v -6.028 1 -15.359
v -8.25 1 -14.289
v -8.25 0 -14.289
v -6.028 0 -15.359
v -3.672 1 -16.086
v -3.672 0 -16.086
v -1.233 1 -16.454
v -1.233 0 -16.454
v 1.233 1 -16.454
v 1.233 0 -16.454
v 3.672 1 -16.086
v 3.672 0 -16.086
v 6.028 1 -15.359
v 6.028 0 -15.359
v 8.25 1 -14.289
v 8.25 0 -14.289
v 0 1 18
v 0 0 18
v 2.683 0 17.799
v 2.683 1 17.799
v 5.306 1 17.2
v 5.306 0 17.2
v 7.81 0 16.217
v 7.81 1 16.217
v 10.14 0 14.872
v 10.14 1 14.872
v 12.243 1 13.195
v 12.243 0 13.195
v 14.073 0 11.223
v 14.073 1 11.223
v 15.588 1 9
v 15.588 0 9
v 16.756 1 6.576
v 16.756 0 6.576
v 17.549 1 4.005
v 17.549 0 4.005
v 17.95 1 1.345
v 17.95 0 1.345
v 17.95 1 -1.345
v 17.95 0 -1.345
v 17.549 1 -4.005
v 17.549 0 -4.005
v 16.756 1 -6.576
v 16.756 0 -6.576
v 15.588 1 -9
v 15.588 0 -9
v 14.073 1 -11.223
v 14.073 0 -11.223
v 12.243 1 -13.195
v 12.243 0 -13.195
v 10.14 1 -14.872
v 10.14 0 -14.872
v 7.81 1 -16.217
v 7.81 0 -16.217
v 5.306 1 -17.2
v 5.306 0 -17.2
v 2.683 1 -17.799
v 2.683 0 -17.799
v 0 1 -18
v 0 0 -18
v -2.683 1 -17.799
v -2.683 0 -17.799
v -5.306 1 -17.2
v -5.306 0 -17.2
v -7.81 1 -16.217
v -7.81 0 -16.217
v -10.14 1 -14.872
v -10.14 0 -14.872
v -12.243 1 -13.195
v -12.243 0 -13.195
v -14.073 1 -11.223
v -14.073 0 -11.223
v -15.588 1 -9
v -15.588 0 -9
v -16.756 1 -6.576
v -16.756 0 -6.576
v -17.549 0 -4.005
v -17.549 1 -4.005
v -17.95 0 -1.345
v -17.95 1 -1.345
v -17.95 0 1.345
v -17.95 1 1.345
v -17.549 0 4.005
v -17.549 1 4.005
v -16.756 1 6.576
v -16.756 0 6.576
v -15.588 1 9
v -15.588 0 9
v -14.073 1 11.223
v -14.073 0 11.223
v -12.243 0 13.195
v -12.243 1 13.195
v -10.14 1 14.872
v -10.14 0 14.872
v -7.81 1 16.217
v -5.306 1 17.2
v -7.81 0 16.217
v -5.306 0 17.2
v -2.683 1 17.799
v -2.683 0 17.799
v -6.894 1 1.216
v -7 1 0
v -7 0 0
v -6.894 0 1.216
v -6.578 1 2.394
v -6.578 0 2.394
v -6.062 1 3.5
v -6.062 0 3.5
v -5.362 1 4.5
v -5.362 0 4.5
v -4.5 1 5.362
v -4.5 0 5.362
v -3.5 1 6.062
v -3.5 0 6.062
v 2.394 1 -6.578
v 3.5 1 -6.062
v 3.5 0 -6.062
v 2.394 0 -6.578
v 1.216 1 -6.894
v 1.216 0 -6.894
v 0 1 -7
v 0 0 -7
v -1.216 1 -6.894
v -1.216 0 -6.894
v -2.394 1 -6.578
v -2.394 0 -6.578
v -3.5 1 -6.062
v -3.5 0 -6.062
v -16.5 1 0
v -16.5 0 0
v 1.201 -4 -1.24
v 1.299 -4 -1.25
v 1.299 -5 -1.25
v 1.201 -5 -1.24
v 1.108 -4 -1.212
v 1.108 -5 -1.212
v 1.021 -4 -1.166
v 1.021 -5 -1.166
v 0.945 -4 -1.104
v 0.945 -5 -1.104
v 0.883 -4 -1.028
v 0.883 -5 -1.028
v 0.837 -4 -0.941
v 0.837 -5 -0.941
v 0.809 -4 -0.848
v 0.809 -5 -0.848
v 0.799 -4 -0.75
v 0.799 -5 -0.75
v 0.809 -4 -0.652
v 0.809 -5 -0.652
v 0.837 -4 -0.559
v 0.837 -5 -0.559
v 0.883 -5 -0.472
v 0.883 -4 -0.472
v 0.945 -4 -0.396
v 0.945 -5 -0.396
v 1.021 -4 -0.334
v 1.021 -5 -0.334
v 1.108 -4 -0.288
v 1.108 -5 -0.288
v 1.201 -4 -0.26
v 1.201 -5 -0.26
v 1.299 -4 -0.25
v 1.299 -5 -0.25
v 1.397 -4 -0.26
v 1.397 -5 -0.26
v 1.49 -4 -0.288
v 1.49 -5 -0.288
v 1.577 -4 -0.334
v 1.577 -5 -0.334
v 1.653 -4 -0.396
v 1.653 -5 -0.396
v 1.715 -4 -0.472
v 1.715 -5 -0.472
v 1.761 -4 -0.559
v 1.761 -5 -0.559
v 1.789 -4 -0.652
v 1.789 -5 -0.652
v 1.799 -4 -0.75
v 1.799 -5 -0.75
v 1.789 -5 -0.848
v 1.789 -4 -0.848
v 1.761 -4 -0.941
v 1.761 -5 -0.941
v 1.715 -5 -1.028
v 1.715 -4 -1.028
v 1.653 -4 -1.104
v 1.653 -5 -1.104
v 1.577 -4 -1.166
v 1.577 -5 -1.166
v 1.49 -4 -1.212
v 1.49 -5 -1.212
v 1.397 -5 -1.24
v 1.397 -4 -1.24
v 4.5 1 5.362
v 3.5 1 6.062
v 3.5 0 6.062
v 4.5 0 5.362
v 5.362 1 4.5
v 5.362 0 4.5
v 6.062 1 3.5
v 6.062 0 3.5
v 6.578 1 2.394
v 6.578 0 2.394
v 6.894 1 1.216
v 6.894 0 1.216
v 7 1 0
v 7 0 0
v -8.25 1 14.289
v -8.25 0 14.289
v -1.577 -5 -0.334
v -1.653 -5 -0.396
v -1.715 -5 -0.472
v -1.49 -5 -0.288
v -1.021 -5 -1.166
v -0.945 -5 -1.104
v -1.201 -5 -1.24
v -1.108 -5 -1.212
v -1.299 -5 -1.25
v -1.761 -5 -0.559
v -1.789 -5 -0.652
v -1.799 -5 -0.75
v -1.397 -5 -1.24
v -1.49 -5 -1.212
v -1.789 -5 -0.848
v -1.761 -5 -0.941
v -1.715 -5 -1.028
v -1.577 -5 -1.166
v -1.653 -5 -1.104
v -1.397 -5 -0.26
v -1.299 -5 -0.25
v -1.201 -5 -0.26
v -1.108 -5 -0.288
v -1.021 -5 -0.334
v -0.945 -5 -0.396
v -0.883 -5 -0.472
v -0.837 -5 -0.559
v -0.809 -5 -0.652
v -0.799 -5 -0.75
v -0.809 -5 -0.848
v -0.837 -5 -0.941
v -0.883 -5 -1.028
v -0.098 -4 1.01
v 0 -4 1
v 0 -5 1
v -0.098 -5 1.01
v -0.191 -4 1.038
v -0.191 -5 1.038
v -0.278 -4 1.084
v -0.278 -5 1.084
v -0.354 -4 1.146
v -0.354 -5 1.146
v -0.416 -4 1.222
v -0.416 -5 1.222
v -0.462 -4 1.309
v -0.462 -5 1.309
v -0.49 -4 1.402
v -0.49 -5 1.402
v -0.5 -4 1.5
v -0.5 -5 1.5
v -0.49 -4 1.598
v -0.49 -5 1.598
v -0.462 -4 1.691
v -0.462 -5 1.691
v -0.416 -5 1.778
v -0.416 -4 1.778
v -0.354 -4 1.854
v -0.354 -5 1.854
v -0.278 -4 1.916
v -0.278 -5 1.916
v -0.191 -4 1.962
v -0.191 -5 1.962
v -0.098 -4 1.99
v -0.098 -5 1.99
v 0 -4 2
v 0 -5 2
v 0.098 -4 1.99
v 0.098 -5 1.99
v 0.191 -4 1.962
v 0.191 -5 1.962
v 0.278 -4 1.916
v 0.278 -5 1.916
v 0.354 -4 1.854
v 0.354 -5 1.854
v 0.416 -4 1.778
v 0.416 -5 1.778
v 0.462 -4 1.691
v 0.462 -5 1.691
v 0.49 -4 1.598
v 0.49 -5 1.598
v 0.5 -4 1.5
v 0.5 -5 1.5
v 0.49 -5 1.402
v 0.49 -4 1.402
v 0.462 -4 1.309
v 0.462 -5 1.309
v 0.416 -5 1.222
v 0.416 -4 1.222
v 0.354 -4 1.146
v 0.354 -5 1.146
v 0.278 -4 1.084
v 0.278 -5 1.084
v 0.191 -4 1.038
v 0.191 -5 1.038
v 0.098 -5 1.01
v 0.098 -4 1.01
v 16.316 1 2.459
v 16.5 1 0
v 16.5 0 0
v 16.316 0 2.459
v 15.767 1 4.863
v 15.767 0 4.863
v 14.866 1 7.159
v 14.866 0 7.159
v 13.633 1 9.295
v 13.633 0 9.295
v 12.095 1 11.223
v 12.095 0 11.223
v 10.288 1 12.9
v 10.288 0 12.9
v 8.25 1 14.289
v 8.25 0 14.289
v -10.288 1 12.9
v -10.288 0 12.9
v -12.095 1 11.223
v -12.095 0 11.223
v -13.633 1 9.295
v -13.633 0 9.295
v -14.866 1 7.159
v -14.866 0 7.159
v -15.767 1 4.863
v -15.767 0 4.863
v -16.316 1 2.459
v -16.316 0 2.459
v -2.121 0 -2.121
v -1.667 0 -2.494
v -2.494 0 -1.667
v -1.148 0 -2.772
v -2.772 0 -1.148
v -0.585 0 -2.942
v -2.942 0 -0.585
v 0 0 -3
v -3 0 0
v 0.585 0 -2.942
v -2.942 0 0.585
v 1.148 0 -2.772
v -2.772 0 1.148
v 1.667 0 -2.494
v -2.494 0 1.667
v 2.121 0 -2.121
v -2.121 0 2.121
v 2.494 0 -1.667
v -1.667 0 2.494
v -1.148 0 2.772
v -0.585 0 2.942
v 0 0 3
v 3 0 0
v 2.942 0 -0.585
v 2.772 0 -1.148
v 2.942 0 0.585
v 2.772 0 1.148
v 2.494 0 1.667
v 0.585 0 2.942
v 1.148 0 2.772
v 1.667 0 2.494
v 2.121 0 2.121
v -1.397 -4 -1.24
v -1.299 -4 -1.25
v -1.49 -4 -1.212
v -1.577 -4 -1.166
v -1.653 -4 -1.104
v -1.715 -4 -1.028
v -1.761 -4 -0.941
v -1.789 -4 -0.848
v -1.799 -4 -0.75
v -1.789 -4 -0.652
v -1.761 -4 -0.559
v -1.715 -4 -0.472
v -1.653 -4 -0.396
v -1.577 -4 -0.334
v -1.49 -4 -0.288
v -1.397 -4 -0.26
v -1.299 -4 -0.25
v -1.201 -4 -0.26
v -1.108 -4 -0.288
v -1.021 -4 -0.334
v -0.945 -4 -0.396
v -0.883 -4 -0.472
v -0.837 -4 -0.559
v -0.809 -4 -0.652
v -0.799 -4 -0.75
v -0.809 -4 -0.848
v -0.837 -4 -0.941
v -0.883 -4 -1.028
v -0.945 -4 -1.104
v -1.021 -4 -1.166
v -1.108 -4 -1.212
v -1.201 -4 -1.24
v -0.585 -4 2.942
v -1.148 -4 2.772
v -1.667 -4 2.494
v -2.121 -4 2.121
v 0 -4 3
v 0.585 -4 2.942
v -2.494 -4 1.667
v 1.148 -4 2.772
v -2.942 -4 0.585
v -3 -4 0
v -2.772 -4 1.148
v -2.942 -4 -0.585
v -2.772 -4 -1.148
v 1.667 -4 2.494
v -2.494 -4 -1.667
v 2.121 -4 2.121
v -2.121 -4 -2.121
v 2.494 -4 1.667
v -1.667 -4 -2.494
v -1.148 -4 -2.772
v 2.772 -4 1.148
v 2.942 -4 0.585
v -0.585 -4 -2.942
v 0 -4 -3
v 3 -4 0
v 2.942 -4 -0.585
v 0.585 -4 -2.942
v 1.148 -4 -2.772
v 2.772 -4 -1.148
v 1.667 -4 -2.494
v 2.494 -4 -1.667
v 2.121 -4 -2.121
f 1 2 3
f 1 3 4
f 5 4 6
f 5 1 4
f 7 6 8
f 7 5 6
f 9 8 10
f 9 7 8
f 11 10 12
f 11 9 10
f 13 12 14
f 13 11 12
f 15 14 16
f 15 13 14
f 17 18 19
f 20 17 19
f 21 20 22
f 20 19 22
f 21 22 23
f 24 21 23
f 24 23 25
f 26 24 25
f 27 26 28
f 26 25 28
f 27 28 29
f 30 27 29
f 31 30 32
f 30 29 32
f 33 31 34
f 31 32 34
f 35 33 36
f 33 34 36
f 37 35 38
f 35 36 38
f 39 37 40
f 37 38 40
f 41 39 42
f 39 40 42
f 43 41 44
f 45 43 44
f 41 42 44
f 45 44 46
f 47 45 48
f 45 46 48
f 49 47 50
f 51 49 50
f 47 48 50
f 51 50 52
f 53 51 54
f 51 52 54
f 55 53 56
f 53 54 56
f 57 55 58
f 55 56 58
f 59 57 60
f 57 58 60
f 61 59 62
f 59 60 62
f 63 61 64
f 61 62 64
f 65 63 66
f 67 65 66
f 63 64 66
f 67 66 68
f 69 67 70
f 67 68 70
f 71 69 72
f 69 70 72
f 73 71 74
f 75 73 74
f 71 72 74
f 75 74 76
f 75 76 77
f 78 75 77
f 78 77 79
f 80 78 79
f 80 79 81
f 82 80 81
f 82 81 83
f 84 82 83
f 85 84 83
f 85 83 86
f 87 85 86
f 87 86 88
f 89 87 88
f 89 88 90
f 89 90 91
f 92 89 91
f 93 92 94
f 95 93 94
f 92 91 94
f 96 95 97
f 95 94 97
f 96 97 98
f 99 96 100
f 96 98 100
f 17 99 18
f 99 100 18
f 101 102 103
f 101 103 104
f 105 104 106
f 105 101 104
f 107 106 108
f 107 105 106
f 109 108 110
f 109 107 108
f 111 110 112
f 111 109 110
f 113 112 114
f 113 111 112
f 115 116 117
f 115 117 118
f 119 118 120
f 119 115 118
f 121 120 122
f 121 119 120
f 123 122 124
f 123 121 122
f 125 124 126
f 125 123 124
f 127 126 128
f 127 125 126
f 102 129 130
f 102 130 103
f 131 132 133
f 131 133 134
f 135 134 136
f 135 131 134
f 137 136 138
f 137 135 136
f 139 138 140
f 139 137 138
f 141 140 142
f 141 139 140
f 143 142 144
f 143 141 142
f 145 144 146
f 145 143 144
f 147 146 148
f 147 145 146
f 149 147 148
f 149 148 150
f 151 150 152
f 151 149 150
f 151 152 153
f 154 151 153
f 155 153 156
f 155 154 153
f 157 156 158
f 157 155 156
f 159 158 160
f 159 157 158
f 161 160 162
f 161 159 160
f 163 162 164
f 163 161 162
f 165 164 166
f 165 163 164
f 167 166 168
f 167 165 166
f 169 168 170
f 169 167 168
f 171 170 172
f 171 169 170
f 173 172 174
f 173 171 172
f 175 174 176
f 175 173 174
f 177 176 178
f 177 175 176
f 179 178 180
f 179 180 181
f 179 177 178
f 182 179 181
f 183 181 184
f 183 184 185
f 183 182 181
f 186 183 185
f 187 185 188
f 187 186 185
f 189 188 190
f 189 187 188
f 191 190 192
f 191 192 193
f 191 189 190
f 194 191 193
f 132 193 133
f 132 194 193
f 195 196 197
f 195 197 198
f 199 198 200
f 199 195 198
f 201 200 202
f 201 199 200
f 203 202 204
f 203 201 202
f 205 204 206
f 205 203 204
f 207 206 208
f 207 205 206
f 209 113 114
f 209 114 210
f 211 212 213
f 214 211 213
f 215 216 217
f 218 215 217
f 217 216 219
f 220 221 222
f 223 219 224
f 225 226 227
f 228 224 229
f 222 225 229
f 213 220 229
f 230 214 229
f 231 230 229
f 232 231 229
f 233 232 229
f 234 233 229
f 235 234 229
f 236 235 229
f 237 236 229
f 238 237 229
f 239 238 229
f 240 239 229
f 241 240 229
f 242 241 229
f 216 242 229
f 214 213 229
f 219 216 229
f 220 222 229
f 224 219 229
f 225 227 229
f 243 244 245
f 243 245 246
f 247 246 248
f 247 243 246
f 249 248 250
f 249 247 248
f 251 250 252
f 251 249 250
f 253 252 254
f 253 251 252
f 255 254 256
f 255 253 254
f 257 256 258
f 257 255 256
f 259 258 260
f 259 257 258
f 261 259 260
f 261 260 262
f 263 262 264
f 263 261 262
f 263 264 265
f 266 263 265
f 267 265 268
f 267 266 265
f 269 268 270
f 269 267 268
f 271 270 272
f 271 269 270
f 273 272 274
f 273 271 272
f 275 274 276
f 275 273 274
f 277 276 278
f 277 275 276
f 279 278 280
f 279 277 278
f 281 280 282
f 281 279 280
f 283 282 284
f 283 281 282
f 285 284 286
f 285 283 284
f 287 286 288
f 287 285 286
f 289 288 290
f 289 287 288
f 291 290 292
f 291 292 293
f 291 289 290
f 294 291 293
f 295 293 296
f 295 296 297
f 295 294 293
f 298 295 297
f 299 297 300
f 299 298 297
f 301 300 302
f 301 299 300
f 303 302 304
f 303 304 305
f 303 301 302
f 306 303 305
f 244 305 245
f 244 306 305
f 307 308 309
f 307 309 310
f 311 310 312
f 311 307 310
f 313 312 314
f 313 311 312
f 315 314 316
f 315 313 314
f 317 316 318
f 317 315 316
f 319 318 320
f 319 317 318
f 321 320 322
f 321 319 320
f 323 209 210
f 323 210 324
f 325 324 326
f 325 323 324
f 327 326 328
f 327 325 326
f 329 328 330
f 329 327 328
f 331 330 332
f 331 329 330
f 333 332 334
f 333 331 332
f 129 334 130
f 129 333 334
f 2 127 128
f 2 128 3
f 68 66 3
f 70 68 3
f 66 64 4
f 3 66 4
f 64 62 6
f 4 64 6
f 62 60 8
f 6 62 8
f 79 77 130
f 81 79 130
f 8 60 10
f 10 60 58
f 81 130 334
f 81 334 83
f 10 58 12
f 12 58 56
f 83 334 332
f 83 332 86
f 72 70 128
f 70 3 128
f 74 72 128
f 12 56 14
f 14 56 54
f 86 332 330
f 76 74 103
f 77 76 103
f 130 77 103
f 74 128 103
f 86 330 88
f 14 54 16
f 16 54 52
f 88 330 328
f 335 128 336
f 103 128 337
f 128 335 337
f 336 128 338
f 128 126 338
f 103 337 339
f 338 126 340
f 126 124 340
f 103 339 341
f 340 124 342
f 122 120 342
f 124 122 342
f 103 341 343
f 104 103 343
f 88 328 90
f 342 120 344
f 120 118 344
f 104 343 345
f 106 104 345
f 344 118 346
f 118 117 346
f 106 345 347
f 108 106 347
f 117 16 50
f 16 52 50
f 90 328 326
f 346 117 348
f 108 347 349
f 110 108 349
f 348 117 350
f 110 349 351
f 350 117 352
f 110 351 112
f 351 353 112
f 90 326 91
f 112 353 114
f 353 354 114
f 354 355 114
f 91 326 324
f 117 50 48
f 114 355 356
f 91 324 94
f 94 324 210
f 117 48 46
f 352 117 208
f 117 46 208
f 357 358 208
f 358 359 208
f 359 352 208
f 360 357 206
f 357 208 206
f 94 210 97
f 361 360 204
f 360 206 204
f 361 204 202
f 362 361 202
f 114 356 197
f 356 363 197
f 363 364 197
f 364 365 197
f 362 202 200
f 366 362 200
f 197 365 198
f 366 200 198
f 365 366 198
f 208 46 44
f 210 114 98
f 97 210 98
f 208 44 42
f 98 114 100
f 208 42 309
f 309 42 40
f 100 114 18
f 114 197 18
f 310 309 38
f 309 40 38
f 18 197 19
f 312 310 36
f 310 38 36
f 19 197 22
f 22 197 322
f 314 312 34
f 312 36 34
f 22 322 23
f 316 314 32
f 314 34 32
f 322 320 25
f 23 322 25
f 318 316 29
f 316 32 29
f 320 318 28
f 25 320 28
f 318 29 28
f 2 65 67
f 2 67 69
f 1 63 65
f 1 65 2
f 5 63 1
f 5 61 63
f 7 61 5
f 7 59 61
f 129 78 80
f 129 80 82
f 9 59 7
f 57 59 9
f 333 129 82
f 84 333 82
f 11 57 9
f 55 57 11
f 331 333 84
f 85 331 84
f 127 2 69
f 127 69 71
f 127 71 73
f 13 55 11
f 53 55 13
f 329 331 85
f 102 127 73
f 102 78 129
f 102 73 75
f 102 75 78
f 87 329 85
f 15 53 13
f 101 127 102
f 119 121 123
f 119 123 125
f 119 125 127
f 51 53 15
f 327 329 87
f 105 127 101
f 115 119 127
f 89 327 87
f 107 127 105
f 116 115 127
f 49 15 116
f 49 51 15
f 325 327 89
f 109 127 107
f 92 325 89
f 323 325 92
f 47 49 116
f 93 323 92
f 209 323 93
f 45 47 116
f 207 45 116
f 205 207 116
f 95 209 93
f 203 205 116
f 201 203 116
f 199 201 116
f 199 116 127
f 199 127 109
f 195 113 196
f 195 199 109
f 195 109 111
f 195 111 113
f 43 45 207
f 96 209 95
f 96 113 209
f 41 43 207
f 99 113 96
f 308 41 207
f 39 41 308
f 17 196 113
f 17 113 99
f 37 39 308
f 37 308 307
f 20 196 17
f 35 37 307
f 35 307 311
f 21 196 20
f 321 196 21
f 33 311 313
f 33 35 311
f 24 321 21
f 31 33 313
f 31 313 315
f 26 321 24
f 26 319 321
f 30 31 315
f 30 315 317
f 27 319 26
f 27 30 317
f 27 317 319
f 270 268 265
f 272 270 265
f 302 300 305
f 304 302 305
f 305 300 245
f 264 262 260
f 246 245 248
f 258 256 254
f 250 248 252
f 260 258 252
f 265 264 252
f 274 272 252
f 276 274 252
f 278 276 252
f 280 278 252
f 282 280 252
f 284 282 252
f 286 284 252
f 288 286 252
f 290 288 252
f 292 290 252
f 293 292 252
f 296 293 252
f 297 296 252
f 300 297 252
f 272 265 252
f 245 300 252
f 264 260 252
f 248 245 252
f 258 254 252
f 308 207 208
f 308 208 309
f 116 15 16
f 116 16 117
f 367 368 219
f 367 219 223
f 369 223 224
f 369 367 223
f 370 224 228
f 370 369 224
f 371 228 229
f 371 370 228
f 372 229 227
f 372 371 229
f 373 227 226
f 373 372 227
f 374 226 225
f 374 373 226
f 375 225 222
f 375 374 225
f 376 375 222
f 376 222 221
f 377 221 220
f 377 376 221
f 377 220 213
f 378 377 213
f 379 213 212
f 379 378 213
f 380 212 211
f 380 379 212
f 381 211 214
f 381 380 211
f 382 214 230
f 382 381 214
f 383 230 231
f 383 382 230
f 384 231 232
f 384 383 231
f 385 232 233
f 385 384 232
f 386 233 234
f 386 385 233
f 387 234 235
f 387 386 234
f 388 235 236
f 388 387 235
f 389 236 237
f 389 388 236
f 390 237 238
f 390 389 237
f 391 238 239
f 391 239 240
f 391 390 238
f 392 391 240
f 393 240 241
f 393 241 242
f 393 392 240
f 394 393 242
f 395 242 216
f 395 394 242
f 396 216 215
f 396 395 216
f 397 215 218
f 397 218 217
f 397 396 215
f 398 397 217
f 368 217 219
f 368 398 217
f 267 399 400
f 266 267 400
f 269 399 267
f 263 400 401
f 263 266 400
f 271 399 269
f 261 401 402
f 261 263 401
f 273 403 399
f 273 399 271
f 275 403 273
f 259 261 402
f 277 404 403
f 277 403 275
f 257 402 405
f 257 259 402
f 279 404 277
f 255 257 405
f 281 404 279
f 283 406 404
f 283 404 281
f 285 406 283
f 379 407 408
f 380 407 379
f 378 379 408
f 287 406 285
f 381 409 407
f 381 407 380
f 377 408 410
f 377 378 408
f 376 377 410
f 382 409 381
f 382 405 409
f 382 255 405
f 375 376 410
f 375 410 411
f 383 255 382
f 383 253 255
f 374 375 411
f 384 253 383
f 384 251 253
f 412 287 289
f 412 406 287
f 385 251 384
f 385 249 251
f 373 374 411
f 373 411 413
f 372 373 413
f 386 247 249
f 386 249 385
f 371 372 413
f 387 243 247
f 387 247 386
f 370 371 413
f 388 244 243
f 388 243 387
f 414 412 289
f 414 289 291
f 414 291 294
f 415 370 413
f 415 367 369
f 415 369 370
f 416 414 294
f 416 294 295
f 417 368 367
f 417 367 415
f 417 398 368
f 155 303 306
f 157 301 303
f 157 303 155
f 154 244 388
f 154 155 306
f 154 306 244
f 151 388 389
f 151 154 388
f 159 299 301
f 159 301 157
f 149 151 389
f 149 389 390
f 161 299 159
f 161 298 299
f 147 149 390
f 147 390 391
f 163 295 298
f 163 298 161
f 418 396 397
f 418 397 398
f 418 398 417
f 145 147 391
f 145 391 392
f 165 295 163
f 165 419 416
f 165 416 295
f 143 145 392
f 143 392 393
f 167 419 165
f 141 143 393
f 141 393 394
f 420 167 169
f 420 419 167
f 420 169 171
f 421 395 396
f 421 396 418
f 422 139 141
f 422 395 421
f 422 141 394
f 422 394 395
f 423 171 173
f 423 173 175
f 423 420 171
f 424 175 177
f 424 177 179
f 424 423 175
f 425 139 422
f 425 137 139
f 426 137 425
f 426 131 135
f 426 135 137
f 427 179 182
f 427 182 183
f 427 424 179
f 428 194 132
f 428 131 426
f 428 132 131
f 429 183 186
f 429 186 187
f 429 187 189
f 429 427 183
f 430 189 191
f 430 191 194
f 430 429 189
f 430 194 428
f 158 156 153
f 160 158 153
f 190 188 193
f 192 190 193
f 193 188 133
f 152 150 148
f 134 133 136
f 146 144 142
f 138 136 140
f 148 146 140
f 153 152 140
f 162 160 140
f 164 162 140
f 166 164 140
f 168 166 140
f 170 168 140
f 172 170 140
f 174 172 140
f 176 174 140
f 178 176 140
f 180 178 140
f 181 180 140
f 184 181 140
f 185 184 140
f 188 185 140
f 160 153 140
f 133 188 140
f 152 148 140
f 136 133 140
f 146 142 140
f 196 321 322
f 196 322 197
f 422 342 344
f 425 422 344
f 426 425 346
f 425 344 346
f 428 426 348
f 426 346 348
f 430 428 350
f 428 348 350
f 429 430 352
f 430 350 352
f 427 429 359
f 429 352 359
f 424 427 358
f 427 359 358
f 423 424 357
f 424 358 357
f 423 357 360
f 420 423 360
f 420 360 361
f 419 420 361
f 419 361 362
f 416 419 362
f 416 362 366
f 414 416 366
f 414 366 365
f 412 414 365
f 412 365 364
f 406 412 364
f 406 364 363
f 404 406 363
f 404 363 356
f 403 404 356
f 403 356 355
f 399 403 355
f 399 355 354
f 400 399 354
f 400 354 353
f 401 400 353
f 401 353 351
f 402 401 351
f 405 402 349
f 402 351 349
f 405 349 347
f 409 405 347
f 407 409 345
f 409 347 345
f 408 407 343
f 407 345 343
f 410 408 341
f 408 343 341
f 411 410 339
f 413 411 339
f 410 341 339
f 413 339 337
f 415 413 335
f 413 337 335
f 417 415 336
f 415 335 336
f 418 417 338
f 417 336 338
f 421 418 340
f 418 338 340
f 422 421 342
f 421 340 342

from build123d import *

# Parameters (mm, degrees)
SKETCH1_R                = 18
BOSS_EXTRUDE1_DEPTH      = 1
SKETCH4_R                = 0.5
CUT_EXTRUDE2_DEPTH       = 1
BOSS_EXTRUDE2_DEPTH      = 4
BOSS_EXTRUDE2_DEPTH_BACK = 1
SKETCH5_R                = 3
BOSS_EXTRUDE3_START      = -5
SKETCH4_3_R              = 0.5
BOSS_EXTRUDE3_DEPTH      = 1


with BuildPart() as part:
    # Sketch1 → Boss-Extrude1 (new body)
    with BuildSketch(Plane(origin=(0, 0, 0), x_dir=(1, 0, 0), z_dir=(0, 1, 0))):
        with Locations(Location((0, 0, 0), (0, 0, 270))):
            Circle(SKETCH1_R)
    extrude(amount=BOSS_EXTRUDE1_DEPTH)

    # Sketch4 → Cut-Extrude2 (cut)
    with BuildSketch(Plane(origin=(0, 1, 0), x_dir=(1, 0, 0), z_dir=(0, 1, 0))):
        with Locations(Location((1.299038106, 0.75, 0), (0, 0, 270))):
            Circle(SKETCH4_R)
        with Locations(Location((0, -1.5, 0), (0, 0, 270))):
            Circle(SKETCH4_R)
        with Locations(Location((-1.299038106, 0.75, 0), (0, 0, 270))):
            Circle(SKETCH4_R)
        with BuildLine():
            Line((-3.5, 6.062177826), (-8.25, 14.289419162))
            ThreePointArc((-8.25, 14.289419162), (0, 16.5), (8.25, 14.289419162))
            Line((8.25, 14.289419162), (3.5, 6.062177826))
            ThreePointArc((3.5, 6.062177826), (0, 7), (-3.5, 6.062177826))
        make_face()
        with BuildLine():
            Line((7, 0), (16.5, 0))
            ThreePointArc((16.5, 0), (14.289419162, -8.25), (8.25, -14.289419162))
            Line((8.25, -14.289419162), (3.5, -6.062177826))
            ThreePointArc((3.5, -6.062177826), (6.062177826, -3.5), (7, 0))
        make_face()
        with BuildLine():
            Line((-3.5, -6.062177826), (-8.25, -14.289419162))
            ThreePointArc((-8.25, -14.289419162), (-14.289419162, -8.25), (-16.5, 0))
            Line((-16.5, 0), (-7, 0))
            ThreePointArc((-7, 0), (-6.062177826, -3.5), (-3.5, -6.062177826))
        make_face()
    extrude(amount=-CUT_EXTRUDE2_DEPTH, mode=Mode.SUBTRACT)

    # Sketch5 → Boss-Extrude2 (add, two sides: drawn at the far end of the back side and taken through both)
    with BuildSketch(Plane.XZ.offset(-BOSS_EXTRUDE2_DEPTH_BACK)):
        with Locations(Location((0, 0, 0), (0, 0, 270))):
            Circle(SKETCH5_R)
    extrude(amount=BOSS_EXTRUDE2_DEPTH + BOSS_EXTRUDE2_DEPTH_BACK)

    # Sketch4<3> → Boss-Extrude3 (add)
    with BuildSketch(Plane(origin=(0, 1, 0), x_dir=(1, 0, 0), z_dir=(0, 1, 0)).offset(BOSS_EXTRUDE3_START)):
        with Locations(Location((0, -1.5, 0), (0, 0, 90))):
            Circle(SKETCH4_3_R)
        with Locations(Location((-1.299038106, 0.75, 0), (0, 0, 90))):
            Circle(SKETCH4_3_R)
        with Locations(Location((1.299038106, 0.75, 0), (0, 0, 90))):
            Circle(SKETCH4_3_R)
    extrude(amount=-BOSS_EXTRUDE3_DEPTH)


solid = part.part
